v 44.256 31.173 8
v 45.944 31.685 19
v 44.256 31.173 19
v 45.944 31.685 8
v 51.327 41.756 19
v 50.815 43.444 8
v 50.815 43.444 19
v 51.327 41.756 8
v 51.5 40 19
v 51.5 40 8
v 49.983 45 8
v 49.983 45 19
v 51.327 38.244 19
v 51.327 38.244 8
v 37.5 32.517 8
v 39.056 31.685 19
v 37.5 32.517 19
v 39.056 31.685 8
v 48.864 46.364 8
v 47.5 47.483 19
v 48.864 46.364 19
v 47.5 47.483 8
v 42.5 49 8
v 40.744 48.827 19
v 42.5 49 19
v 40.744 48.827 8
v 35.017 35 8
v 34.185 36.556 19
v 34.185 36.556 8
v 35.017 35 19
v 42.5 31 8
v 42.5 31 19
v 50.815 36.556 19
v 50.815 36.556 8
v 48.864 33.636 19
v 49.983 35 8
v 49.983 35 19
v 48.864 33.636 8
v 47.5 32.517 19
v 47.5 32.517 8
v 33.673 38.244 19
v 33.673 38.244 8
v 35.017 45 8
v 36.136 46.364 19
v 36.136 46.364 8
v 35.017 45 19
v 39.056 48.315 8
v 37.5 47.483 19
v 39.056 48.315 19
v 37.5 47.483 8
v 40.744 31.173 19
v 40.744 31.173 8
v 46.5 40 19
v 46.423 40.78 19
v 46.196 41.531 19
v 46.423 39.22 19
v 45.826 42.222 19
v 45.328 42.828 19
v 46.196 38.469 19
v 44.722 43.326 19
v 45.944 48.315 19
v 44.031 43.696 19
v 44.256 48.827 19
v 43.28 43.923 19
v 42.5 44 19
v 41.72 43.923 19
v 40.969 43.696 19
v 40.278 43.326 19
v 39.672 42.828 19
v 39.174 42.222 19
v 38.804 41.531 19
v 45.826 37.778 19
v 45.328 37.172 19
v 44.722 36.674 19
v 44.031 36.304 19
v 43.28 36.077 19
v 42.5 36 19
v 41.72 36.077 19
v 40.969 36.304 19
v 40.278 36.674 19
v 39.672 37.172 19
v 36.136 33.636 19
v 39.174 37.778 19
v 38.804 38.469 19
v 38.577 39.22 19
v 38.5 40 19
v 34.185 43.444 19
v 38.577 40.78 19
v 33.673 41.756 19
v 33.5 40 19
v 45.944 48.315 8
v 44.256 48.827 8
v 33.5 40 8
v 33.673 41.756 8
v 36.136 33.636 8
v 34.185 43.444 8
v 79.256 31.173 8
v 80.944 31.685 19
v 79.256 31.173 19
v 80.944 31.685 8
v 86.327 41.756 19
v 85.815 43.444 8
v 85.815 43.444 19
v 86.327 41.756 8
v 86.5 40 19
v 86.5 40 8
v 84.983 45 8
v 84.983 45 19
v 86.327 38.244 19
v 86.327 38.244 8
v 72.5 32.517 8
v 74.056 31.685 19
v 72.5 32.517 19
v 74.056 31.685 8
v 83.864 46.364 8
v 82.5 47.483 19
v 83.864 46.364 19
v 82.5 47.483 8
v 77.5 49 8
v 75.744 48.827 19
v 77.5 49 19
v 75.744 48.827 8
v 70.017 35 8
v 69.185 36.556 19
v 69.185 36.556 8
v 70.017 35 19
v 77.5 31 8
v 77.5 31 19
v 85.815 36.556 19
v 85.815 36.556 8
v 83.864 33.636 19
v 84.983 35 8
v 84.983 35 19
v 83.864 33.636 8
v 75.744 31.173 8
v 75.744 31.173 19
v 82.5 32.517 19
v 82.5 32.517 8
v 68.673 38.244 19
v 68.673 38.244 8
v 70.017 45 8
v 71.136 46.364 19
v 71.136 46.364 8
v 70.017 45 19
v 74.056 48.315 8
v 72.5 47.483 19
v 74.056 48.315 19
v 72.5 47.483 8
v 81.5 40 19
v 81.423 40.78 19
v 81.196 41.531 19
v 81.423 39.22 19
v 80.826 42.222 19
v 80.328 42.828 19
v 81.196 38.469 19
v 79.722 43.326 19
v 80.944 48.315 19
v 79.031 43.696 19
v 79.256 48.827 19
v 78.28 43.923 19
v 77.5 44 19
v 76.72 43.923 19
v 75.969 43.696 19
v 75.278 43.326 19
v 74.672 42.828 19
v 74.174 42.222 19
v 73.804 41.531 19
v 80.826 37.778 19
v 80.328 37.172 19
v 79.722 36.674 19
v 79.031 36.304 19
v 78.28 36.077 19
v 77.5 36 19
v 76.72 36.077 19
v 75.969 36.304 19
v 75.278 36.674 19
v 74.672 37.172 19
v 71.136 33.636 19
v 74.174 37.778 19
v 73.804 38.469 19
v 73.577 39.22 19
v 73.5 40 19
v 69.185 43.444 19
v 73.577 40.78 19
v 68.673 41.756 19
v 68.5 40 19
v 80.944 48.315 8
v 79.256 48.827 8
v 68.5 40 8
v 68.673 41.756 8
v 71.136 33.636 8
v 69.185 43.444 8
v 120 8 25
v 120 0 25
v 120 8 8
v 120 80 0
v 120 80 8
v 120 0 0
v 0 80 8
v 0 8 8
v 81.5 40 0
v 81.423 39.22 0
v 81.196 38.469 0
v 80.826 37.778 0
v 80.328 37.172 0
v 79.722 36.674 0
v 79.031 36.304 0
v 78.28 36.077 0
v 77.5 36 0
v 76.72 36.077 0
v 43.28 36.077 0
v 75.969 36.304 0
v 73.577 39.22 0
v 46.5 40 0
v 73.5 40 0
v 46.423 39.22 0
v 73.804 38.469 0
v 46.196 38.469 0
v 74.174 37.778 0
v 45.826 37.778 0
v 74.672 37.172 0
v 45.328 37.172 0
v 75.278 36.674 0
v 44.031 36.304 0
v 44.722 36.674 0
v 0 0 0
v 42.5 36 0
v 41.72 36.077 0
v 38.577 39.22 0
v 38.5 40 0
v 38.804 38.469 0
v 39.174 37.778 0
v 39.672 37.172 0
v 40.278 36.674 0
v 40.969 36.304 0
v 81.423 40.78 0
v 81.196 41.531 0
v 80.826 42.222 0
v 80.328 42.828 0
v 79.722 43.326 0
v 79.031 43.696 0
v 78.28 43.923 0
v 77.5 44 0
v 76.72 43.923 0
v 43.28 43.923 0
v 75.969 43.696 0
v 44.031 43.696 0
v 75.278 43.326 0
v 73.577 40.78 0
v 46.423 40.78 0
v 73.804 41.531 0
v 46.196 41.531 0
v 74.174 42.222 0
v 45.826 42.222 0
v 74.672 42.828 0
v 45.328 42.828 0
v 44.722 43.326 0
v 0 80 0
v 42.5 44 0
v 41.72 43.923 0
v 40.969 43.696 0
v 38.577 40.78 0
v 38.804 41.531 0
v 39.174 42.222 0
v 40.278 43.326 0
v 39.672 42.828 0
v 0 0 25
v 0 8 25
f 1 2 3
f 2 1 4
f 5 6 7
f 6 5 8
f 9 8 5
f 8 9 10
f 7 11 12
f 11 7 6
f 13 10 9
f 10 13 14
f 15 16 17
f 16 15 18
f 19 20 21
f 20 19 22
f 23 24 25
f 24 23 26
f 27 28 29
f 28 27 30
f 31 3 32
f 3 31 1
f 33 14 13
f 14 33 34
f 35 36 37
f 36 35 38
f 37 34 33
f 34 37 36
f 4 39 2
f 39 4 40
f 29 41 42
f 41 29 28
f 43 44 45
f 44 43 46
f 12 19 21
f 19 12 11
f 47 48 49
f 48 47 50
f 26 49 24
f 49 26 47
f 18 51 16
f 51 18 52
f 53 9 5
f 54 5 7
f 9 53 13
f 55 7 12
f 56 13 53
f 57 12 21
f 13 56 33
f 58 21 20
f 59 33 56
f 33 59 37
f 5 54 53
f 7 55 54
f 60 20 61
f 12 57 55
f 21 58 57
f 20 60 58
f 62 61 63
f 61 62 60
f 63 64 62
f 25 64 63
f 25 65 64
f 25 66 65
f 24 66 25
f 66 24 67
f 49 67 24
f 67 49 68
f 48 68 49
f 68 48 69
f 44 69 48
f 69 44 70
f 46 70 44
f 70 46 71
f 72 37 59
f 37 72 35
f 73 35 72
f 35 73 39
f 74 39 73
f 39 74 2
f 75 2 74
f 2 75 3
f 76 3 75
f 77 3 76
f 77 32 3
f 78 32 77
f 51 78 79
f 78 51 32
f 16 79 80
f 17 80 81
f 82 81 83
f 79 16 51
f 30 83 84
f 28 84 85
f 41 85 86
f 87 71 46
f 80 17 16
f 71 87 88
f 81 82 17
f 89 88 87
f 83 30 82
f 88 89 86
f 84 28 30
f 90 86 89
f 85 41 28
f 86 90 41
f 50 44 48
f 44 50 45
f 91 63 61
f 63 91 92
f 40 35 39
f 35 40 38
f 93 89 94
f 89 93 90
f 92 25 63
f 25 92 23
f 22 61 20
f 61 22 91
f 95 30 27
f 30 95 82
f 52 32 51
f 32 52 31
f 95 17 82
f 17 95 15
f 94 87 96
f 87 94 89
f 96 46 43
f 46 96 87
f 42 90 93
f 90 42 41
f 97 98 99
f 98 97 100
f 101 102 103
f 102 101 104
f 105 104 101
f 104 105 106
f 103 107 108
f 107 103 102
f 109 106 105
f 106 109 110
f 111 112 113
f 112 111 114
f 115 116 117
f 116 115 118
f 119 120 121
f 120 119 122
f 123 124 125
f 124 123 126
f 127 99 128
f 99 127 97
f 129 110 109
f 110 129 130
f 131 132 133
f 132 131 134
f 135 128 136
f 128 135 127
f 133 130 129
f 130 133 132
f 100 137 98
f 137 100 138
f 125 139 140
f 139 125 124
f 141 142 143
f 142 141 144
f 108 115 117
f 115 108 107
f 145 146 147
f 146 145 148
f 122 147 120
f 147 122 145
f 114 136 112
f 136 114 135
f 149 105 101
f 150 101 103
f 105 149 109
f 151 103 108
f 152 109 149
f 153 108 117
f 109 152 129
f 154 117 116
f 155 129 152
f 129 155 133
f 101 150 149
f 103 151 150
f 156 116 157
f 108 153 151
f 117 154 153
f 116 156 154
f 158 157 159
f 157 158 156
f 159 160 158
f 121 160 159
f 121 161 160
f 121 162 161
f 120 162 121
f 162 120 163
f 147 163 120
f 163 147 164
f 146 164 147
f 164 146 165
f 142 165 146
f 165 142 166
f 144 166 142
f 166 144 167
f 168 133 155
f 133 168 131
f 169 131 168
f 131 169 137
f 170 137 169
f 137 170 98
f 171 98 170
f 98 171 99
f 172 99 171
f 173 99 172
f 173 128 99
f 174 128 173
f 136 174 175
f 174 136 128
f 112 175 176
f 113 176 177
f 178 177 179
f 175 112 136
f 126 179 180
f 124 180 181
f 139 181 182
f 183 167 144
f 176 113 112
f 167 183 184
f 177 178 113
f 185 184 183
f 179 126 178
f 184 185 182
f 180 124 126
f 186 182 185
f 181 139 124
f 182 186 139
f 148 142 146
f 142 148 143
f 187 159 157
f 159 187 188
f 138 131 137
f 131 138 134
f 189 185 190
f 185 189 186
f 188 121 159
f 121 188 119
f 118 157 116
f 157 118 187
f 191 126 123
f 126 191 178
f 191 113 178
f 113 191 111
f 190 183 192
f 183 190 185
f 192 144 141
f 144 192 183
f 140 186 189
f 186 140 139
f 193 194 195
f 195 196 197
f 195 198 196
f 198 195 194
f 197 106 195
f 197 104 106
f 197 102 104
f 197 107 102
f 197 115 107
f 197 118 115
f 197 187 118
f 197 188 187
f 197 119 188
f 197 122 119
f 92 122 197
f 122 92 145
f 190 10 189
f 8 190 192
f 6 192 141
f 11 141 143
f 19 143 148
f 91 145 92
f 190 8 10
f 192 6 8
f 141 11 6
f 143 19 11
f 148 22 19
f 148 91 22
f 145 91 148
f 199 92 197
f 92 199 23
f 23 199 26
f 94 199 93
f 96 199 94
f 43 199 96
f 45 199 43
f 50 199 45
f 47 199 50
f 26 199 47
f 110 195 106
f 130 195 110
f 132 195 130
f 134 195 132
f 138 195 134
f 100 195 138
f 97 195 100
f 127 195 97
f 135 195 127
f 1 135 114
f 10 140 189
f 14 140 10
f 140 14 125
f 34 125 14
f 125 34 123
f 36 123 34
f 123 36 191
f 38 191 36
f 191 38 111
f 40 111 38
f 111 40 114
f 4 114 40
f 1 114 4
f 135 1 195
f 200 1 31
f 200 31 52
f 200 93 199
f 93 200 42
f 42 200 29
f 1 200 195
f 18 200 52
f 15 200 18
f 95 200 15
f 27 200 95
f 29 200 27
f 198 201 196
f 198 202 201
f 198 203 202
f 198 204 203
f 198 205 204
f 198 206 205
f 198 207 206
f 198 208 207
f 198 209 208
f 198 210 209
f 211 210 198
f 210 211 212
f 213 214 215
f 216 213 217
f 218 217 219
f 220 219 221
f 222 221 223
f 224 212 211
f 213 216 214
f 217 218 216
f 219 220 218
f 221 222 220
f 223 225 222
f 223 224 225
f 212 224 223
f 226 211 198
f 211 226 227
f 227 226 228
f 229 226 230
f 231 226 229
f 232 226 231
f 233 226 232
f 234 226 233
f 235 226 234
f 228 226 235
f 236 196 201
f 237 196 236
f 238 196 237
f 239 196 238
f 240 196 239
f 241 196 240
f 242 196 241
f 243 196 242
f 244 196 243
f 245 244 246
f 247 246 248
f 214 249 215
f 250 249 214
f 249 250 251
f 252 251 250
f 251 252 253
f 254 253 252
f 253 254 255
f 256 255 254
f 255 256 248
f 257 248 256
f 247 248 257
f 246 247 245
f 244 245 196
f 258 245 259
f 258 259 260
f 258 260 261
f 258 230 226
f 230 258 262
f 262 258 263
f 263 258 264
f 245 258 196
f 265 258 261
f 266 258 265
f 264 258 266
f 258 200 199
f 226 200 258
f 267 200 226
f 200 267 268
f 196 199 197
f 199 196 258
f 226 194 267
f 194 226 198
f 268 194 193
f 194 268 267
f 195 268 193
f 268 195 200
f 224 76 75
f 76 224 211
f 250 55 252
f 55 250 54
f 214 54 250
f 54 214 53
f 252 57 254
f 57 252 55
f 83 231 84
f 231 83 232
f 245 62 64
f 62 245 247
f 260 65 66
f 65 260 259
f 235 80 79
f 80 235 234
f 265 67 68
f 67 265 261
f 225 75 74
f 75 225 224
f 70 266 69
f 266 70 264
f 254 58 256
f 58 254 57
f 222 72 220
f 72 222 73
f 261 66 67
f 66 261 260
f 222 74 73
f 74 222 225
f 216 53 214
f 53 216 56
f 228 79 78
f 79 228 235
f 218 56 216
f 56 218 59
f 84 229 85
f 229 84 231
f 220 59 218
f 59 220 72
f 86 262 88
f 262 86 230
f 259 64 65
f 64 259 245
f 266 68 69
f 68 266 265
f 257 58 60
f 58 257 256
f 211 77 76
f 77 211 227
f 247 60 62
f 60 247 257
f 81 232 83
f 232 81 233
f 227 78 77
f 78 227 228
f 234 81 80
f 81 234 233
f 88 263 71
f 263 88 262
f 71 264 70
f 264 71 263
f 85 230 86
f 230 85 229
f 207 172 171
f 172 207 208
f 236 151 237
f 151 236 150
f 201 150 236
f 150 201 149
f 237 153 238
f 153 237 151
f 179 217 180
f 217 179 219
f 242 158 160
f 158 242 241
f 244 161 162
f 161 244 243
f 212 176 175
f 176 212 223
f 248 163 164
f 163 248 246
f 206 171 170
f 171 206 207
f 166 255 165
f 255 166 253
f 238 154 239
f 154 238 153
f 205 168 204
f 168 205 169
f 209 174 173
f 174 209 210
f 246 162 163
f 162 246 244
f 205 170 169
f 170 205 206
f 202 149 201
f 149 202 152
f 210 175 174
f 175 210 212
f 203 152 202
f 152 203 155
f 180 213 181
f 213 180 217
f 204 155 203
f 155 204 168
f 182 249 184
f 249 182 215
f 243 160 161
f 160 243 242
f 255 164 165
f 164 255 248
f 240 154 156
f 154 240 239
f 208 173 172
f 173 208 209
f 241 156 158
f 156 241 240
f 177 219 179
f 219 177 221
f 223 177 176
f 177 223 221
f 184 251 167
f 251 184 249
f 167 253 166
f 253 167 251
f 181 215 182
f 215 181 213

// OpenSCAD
$fn = 32;

// ----------------------------------------------------------------------
// Drill jig: fence jig
// ----------------------------------------------------------------------

// --- parameters (mm) ---
plate_l = 120;            // plate length, X
plate_w = 80;             // plate width, Y
plate_t = 8;              // plate thickness
boss_d = 18;              // guide boss diameter
boss_h = 12;              // boss height above the plate
guide_d = 8;              // guide hole diameter
boss_pitch = 35;          // boss pitch
fence_h = 18;             // fence height above the plate
fence_t = 8;              // fence thickness

n_boss = 2;  // guide bosses
boss_x0 = (plate_l - (n_boss - 1) * boss_pitch) / 2;  // first boss X
boss_top = plate_t - 1 + boss_h;  // boss crown height
fence_top = plate_t - 1 + fence_h;  // fence crown height
total_h = max([fence_top, boss_top]);  // overall height

difference() {
  union() {
  cube([plate_l, plate_w, plate_t]);
  for (i = [0 : n_boss - 1])
    translate([boss_x0 + i * boss_pitch, plate_w / 2, plate_t - 1])
      cylinder(h = boss_h, d = boss_d);
  translate([0, 0, plate_t - 1]) cube([plate_l, fence_t, fence_h]);
  }
  for (i = [0 : n_boss - 1])
    translate([boss_x0 + i * boss_pitch, plate_w / 2, -1])
      cylinder(h = plate_t + boss_h, d = guide_d);
}
